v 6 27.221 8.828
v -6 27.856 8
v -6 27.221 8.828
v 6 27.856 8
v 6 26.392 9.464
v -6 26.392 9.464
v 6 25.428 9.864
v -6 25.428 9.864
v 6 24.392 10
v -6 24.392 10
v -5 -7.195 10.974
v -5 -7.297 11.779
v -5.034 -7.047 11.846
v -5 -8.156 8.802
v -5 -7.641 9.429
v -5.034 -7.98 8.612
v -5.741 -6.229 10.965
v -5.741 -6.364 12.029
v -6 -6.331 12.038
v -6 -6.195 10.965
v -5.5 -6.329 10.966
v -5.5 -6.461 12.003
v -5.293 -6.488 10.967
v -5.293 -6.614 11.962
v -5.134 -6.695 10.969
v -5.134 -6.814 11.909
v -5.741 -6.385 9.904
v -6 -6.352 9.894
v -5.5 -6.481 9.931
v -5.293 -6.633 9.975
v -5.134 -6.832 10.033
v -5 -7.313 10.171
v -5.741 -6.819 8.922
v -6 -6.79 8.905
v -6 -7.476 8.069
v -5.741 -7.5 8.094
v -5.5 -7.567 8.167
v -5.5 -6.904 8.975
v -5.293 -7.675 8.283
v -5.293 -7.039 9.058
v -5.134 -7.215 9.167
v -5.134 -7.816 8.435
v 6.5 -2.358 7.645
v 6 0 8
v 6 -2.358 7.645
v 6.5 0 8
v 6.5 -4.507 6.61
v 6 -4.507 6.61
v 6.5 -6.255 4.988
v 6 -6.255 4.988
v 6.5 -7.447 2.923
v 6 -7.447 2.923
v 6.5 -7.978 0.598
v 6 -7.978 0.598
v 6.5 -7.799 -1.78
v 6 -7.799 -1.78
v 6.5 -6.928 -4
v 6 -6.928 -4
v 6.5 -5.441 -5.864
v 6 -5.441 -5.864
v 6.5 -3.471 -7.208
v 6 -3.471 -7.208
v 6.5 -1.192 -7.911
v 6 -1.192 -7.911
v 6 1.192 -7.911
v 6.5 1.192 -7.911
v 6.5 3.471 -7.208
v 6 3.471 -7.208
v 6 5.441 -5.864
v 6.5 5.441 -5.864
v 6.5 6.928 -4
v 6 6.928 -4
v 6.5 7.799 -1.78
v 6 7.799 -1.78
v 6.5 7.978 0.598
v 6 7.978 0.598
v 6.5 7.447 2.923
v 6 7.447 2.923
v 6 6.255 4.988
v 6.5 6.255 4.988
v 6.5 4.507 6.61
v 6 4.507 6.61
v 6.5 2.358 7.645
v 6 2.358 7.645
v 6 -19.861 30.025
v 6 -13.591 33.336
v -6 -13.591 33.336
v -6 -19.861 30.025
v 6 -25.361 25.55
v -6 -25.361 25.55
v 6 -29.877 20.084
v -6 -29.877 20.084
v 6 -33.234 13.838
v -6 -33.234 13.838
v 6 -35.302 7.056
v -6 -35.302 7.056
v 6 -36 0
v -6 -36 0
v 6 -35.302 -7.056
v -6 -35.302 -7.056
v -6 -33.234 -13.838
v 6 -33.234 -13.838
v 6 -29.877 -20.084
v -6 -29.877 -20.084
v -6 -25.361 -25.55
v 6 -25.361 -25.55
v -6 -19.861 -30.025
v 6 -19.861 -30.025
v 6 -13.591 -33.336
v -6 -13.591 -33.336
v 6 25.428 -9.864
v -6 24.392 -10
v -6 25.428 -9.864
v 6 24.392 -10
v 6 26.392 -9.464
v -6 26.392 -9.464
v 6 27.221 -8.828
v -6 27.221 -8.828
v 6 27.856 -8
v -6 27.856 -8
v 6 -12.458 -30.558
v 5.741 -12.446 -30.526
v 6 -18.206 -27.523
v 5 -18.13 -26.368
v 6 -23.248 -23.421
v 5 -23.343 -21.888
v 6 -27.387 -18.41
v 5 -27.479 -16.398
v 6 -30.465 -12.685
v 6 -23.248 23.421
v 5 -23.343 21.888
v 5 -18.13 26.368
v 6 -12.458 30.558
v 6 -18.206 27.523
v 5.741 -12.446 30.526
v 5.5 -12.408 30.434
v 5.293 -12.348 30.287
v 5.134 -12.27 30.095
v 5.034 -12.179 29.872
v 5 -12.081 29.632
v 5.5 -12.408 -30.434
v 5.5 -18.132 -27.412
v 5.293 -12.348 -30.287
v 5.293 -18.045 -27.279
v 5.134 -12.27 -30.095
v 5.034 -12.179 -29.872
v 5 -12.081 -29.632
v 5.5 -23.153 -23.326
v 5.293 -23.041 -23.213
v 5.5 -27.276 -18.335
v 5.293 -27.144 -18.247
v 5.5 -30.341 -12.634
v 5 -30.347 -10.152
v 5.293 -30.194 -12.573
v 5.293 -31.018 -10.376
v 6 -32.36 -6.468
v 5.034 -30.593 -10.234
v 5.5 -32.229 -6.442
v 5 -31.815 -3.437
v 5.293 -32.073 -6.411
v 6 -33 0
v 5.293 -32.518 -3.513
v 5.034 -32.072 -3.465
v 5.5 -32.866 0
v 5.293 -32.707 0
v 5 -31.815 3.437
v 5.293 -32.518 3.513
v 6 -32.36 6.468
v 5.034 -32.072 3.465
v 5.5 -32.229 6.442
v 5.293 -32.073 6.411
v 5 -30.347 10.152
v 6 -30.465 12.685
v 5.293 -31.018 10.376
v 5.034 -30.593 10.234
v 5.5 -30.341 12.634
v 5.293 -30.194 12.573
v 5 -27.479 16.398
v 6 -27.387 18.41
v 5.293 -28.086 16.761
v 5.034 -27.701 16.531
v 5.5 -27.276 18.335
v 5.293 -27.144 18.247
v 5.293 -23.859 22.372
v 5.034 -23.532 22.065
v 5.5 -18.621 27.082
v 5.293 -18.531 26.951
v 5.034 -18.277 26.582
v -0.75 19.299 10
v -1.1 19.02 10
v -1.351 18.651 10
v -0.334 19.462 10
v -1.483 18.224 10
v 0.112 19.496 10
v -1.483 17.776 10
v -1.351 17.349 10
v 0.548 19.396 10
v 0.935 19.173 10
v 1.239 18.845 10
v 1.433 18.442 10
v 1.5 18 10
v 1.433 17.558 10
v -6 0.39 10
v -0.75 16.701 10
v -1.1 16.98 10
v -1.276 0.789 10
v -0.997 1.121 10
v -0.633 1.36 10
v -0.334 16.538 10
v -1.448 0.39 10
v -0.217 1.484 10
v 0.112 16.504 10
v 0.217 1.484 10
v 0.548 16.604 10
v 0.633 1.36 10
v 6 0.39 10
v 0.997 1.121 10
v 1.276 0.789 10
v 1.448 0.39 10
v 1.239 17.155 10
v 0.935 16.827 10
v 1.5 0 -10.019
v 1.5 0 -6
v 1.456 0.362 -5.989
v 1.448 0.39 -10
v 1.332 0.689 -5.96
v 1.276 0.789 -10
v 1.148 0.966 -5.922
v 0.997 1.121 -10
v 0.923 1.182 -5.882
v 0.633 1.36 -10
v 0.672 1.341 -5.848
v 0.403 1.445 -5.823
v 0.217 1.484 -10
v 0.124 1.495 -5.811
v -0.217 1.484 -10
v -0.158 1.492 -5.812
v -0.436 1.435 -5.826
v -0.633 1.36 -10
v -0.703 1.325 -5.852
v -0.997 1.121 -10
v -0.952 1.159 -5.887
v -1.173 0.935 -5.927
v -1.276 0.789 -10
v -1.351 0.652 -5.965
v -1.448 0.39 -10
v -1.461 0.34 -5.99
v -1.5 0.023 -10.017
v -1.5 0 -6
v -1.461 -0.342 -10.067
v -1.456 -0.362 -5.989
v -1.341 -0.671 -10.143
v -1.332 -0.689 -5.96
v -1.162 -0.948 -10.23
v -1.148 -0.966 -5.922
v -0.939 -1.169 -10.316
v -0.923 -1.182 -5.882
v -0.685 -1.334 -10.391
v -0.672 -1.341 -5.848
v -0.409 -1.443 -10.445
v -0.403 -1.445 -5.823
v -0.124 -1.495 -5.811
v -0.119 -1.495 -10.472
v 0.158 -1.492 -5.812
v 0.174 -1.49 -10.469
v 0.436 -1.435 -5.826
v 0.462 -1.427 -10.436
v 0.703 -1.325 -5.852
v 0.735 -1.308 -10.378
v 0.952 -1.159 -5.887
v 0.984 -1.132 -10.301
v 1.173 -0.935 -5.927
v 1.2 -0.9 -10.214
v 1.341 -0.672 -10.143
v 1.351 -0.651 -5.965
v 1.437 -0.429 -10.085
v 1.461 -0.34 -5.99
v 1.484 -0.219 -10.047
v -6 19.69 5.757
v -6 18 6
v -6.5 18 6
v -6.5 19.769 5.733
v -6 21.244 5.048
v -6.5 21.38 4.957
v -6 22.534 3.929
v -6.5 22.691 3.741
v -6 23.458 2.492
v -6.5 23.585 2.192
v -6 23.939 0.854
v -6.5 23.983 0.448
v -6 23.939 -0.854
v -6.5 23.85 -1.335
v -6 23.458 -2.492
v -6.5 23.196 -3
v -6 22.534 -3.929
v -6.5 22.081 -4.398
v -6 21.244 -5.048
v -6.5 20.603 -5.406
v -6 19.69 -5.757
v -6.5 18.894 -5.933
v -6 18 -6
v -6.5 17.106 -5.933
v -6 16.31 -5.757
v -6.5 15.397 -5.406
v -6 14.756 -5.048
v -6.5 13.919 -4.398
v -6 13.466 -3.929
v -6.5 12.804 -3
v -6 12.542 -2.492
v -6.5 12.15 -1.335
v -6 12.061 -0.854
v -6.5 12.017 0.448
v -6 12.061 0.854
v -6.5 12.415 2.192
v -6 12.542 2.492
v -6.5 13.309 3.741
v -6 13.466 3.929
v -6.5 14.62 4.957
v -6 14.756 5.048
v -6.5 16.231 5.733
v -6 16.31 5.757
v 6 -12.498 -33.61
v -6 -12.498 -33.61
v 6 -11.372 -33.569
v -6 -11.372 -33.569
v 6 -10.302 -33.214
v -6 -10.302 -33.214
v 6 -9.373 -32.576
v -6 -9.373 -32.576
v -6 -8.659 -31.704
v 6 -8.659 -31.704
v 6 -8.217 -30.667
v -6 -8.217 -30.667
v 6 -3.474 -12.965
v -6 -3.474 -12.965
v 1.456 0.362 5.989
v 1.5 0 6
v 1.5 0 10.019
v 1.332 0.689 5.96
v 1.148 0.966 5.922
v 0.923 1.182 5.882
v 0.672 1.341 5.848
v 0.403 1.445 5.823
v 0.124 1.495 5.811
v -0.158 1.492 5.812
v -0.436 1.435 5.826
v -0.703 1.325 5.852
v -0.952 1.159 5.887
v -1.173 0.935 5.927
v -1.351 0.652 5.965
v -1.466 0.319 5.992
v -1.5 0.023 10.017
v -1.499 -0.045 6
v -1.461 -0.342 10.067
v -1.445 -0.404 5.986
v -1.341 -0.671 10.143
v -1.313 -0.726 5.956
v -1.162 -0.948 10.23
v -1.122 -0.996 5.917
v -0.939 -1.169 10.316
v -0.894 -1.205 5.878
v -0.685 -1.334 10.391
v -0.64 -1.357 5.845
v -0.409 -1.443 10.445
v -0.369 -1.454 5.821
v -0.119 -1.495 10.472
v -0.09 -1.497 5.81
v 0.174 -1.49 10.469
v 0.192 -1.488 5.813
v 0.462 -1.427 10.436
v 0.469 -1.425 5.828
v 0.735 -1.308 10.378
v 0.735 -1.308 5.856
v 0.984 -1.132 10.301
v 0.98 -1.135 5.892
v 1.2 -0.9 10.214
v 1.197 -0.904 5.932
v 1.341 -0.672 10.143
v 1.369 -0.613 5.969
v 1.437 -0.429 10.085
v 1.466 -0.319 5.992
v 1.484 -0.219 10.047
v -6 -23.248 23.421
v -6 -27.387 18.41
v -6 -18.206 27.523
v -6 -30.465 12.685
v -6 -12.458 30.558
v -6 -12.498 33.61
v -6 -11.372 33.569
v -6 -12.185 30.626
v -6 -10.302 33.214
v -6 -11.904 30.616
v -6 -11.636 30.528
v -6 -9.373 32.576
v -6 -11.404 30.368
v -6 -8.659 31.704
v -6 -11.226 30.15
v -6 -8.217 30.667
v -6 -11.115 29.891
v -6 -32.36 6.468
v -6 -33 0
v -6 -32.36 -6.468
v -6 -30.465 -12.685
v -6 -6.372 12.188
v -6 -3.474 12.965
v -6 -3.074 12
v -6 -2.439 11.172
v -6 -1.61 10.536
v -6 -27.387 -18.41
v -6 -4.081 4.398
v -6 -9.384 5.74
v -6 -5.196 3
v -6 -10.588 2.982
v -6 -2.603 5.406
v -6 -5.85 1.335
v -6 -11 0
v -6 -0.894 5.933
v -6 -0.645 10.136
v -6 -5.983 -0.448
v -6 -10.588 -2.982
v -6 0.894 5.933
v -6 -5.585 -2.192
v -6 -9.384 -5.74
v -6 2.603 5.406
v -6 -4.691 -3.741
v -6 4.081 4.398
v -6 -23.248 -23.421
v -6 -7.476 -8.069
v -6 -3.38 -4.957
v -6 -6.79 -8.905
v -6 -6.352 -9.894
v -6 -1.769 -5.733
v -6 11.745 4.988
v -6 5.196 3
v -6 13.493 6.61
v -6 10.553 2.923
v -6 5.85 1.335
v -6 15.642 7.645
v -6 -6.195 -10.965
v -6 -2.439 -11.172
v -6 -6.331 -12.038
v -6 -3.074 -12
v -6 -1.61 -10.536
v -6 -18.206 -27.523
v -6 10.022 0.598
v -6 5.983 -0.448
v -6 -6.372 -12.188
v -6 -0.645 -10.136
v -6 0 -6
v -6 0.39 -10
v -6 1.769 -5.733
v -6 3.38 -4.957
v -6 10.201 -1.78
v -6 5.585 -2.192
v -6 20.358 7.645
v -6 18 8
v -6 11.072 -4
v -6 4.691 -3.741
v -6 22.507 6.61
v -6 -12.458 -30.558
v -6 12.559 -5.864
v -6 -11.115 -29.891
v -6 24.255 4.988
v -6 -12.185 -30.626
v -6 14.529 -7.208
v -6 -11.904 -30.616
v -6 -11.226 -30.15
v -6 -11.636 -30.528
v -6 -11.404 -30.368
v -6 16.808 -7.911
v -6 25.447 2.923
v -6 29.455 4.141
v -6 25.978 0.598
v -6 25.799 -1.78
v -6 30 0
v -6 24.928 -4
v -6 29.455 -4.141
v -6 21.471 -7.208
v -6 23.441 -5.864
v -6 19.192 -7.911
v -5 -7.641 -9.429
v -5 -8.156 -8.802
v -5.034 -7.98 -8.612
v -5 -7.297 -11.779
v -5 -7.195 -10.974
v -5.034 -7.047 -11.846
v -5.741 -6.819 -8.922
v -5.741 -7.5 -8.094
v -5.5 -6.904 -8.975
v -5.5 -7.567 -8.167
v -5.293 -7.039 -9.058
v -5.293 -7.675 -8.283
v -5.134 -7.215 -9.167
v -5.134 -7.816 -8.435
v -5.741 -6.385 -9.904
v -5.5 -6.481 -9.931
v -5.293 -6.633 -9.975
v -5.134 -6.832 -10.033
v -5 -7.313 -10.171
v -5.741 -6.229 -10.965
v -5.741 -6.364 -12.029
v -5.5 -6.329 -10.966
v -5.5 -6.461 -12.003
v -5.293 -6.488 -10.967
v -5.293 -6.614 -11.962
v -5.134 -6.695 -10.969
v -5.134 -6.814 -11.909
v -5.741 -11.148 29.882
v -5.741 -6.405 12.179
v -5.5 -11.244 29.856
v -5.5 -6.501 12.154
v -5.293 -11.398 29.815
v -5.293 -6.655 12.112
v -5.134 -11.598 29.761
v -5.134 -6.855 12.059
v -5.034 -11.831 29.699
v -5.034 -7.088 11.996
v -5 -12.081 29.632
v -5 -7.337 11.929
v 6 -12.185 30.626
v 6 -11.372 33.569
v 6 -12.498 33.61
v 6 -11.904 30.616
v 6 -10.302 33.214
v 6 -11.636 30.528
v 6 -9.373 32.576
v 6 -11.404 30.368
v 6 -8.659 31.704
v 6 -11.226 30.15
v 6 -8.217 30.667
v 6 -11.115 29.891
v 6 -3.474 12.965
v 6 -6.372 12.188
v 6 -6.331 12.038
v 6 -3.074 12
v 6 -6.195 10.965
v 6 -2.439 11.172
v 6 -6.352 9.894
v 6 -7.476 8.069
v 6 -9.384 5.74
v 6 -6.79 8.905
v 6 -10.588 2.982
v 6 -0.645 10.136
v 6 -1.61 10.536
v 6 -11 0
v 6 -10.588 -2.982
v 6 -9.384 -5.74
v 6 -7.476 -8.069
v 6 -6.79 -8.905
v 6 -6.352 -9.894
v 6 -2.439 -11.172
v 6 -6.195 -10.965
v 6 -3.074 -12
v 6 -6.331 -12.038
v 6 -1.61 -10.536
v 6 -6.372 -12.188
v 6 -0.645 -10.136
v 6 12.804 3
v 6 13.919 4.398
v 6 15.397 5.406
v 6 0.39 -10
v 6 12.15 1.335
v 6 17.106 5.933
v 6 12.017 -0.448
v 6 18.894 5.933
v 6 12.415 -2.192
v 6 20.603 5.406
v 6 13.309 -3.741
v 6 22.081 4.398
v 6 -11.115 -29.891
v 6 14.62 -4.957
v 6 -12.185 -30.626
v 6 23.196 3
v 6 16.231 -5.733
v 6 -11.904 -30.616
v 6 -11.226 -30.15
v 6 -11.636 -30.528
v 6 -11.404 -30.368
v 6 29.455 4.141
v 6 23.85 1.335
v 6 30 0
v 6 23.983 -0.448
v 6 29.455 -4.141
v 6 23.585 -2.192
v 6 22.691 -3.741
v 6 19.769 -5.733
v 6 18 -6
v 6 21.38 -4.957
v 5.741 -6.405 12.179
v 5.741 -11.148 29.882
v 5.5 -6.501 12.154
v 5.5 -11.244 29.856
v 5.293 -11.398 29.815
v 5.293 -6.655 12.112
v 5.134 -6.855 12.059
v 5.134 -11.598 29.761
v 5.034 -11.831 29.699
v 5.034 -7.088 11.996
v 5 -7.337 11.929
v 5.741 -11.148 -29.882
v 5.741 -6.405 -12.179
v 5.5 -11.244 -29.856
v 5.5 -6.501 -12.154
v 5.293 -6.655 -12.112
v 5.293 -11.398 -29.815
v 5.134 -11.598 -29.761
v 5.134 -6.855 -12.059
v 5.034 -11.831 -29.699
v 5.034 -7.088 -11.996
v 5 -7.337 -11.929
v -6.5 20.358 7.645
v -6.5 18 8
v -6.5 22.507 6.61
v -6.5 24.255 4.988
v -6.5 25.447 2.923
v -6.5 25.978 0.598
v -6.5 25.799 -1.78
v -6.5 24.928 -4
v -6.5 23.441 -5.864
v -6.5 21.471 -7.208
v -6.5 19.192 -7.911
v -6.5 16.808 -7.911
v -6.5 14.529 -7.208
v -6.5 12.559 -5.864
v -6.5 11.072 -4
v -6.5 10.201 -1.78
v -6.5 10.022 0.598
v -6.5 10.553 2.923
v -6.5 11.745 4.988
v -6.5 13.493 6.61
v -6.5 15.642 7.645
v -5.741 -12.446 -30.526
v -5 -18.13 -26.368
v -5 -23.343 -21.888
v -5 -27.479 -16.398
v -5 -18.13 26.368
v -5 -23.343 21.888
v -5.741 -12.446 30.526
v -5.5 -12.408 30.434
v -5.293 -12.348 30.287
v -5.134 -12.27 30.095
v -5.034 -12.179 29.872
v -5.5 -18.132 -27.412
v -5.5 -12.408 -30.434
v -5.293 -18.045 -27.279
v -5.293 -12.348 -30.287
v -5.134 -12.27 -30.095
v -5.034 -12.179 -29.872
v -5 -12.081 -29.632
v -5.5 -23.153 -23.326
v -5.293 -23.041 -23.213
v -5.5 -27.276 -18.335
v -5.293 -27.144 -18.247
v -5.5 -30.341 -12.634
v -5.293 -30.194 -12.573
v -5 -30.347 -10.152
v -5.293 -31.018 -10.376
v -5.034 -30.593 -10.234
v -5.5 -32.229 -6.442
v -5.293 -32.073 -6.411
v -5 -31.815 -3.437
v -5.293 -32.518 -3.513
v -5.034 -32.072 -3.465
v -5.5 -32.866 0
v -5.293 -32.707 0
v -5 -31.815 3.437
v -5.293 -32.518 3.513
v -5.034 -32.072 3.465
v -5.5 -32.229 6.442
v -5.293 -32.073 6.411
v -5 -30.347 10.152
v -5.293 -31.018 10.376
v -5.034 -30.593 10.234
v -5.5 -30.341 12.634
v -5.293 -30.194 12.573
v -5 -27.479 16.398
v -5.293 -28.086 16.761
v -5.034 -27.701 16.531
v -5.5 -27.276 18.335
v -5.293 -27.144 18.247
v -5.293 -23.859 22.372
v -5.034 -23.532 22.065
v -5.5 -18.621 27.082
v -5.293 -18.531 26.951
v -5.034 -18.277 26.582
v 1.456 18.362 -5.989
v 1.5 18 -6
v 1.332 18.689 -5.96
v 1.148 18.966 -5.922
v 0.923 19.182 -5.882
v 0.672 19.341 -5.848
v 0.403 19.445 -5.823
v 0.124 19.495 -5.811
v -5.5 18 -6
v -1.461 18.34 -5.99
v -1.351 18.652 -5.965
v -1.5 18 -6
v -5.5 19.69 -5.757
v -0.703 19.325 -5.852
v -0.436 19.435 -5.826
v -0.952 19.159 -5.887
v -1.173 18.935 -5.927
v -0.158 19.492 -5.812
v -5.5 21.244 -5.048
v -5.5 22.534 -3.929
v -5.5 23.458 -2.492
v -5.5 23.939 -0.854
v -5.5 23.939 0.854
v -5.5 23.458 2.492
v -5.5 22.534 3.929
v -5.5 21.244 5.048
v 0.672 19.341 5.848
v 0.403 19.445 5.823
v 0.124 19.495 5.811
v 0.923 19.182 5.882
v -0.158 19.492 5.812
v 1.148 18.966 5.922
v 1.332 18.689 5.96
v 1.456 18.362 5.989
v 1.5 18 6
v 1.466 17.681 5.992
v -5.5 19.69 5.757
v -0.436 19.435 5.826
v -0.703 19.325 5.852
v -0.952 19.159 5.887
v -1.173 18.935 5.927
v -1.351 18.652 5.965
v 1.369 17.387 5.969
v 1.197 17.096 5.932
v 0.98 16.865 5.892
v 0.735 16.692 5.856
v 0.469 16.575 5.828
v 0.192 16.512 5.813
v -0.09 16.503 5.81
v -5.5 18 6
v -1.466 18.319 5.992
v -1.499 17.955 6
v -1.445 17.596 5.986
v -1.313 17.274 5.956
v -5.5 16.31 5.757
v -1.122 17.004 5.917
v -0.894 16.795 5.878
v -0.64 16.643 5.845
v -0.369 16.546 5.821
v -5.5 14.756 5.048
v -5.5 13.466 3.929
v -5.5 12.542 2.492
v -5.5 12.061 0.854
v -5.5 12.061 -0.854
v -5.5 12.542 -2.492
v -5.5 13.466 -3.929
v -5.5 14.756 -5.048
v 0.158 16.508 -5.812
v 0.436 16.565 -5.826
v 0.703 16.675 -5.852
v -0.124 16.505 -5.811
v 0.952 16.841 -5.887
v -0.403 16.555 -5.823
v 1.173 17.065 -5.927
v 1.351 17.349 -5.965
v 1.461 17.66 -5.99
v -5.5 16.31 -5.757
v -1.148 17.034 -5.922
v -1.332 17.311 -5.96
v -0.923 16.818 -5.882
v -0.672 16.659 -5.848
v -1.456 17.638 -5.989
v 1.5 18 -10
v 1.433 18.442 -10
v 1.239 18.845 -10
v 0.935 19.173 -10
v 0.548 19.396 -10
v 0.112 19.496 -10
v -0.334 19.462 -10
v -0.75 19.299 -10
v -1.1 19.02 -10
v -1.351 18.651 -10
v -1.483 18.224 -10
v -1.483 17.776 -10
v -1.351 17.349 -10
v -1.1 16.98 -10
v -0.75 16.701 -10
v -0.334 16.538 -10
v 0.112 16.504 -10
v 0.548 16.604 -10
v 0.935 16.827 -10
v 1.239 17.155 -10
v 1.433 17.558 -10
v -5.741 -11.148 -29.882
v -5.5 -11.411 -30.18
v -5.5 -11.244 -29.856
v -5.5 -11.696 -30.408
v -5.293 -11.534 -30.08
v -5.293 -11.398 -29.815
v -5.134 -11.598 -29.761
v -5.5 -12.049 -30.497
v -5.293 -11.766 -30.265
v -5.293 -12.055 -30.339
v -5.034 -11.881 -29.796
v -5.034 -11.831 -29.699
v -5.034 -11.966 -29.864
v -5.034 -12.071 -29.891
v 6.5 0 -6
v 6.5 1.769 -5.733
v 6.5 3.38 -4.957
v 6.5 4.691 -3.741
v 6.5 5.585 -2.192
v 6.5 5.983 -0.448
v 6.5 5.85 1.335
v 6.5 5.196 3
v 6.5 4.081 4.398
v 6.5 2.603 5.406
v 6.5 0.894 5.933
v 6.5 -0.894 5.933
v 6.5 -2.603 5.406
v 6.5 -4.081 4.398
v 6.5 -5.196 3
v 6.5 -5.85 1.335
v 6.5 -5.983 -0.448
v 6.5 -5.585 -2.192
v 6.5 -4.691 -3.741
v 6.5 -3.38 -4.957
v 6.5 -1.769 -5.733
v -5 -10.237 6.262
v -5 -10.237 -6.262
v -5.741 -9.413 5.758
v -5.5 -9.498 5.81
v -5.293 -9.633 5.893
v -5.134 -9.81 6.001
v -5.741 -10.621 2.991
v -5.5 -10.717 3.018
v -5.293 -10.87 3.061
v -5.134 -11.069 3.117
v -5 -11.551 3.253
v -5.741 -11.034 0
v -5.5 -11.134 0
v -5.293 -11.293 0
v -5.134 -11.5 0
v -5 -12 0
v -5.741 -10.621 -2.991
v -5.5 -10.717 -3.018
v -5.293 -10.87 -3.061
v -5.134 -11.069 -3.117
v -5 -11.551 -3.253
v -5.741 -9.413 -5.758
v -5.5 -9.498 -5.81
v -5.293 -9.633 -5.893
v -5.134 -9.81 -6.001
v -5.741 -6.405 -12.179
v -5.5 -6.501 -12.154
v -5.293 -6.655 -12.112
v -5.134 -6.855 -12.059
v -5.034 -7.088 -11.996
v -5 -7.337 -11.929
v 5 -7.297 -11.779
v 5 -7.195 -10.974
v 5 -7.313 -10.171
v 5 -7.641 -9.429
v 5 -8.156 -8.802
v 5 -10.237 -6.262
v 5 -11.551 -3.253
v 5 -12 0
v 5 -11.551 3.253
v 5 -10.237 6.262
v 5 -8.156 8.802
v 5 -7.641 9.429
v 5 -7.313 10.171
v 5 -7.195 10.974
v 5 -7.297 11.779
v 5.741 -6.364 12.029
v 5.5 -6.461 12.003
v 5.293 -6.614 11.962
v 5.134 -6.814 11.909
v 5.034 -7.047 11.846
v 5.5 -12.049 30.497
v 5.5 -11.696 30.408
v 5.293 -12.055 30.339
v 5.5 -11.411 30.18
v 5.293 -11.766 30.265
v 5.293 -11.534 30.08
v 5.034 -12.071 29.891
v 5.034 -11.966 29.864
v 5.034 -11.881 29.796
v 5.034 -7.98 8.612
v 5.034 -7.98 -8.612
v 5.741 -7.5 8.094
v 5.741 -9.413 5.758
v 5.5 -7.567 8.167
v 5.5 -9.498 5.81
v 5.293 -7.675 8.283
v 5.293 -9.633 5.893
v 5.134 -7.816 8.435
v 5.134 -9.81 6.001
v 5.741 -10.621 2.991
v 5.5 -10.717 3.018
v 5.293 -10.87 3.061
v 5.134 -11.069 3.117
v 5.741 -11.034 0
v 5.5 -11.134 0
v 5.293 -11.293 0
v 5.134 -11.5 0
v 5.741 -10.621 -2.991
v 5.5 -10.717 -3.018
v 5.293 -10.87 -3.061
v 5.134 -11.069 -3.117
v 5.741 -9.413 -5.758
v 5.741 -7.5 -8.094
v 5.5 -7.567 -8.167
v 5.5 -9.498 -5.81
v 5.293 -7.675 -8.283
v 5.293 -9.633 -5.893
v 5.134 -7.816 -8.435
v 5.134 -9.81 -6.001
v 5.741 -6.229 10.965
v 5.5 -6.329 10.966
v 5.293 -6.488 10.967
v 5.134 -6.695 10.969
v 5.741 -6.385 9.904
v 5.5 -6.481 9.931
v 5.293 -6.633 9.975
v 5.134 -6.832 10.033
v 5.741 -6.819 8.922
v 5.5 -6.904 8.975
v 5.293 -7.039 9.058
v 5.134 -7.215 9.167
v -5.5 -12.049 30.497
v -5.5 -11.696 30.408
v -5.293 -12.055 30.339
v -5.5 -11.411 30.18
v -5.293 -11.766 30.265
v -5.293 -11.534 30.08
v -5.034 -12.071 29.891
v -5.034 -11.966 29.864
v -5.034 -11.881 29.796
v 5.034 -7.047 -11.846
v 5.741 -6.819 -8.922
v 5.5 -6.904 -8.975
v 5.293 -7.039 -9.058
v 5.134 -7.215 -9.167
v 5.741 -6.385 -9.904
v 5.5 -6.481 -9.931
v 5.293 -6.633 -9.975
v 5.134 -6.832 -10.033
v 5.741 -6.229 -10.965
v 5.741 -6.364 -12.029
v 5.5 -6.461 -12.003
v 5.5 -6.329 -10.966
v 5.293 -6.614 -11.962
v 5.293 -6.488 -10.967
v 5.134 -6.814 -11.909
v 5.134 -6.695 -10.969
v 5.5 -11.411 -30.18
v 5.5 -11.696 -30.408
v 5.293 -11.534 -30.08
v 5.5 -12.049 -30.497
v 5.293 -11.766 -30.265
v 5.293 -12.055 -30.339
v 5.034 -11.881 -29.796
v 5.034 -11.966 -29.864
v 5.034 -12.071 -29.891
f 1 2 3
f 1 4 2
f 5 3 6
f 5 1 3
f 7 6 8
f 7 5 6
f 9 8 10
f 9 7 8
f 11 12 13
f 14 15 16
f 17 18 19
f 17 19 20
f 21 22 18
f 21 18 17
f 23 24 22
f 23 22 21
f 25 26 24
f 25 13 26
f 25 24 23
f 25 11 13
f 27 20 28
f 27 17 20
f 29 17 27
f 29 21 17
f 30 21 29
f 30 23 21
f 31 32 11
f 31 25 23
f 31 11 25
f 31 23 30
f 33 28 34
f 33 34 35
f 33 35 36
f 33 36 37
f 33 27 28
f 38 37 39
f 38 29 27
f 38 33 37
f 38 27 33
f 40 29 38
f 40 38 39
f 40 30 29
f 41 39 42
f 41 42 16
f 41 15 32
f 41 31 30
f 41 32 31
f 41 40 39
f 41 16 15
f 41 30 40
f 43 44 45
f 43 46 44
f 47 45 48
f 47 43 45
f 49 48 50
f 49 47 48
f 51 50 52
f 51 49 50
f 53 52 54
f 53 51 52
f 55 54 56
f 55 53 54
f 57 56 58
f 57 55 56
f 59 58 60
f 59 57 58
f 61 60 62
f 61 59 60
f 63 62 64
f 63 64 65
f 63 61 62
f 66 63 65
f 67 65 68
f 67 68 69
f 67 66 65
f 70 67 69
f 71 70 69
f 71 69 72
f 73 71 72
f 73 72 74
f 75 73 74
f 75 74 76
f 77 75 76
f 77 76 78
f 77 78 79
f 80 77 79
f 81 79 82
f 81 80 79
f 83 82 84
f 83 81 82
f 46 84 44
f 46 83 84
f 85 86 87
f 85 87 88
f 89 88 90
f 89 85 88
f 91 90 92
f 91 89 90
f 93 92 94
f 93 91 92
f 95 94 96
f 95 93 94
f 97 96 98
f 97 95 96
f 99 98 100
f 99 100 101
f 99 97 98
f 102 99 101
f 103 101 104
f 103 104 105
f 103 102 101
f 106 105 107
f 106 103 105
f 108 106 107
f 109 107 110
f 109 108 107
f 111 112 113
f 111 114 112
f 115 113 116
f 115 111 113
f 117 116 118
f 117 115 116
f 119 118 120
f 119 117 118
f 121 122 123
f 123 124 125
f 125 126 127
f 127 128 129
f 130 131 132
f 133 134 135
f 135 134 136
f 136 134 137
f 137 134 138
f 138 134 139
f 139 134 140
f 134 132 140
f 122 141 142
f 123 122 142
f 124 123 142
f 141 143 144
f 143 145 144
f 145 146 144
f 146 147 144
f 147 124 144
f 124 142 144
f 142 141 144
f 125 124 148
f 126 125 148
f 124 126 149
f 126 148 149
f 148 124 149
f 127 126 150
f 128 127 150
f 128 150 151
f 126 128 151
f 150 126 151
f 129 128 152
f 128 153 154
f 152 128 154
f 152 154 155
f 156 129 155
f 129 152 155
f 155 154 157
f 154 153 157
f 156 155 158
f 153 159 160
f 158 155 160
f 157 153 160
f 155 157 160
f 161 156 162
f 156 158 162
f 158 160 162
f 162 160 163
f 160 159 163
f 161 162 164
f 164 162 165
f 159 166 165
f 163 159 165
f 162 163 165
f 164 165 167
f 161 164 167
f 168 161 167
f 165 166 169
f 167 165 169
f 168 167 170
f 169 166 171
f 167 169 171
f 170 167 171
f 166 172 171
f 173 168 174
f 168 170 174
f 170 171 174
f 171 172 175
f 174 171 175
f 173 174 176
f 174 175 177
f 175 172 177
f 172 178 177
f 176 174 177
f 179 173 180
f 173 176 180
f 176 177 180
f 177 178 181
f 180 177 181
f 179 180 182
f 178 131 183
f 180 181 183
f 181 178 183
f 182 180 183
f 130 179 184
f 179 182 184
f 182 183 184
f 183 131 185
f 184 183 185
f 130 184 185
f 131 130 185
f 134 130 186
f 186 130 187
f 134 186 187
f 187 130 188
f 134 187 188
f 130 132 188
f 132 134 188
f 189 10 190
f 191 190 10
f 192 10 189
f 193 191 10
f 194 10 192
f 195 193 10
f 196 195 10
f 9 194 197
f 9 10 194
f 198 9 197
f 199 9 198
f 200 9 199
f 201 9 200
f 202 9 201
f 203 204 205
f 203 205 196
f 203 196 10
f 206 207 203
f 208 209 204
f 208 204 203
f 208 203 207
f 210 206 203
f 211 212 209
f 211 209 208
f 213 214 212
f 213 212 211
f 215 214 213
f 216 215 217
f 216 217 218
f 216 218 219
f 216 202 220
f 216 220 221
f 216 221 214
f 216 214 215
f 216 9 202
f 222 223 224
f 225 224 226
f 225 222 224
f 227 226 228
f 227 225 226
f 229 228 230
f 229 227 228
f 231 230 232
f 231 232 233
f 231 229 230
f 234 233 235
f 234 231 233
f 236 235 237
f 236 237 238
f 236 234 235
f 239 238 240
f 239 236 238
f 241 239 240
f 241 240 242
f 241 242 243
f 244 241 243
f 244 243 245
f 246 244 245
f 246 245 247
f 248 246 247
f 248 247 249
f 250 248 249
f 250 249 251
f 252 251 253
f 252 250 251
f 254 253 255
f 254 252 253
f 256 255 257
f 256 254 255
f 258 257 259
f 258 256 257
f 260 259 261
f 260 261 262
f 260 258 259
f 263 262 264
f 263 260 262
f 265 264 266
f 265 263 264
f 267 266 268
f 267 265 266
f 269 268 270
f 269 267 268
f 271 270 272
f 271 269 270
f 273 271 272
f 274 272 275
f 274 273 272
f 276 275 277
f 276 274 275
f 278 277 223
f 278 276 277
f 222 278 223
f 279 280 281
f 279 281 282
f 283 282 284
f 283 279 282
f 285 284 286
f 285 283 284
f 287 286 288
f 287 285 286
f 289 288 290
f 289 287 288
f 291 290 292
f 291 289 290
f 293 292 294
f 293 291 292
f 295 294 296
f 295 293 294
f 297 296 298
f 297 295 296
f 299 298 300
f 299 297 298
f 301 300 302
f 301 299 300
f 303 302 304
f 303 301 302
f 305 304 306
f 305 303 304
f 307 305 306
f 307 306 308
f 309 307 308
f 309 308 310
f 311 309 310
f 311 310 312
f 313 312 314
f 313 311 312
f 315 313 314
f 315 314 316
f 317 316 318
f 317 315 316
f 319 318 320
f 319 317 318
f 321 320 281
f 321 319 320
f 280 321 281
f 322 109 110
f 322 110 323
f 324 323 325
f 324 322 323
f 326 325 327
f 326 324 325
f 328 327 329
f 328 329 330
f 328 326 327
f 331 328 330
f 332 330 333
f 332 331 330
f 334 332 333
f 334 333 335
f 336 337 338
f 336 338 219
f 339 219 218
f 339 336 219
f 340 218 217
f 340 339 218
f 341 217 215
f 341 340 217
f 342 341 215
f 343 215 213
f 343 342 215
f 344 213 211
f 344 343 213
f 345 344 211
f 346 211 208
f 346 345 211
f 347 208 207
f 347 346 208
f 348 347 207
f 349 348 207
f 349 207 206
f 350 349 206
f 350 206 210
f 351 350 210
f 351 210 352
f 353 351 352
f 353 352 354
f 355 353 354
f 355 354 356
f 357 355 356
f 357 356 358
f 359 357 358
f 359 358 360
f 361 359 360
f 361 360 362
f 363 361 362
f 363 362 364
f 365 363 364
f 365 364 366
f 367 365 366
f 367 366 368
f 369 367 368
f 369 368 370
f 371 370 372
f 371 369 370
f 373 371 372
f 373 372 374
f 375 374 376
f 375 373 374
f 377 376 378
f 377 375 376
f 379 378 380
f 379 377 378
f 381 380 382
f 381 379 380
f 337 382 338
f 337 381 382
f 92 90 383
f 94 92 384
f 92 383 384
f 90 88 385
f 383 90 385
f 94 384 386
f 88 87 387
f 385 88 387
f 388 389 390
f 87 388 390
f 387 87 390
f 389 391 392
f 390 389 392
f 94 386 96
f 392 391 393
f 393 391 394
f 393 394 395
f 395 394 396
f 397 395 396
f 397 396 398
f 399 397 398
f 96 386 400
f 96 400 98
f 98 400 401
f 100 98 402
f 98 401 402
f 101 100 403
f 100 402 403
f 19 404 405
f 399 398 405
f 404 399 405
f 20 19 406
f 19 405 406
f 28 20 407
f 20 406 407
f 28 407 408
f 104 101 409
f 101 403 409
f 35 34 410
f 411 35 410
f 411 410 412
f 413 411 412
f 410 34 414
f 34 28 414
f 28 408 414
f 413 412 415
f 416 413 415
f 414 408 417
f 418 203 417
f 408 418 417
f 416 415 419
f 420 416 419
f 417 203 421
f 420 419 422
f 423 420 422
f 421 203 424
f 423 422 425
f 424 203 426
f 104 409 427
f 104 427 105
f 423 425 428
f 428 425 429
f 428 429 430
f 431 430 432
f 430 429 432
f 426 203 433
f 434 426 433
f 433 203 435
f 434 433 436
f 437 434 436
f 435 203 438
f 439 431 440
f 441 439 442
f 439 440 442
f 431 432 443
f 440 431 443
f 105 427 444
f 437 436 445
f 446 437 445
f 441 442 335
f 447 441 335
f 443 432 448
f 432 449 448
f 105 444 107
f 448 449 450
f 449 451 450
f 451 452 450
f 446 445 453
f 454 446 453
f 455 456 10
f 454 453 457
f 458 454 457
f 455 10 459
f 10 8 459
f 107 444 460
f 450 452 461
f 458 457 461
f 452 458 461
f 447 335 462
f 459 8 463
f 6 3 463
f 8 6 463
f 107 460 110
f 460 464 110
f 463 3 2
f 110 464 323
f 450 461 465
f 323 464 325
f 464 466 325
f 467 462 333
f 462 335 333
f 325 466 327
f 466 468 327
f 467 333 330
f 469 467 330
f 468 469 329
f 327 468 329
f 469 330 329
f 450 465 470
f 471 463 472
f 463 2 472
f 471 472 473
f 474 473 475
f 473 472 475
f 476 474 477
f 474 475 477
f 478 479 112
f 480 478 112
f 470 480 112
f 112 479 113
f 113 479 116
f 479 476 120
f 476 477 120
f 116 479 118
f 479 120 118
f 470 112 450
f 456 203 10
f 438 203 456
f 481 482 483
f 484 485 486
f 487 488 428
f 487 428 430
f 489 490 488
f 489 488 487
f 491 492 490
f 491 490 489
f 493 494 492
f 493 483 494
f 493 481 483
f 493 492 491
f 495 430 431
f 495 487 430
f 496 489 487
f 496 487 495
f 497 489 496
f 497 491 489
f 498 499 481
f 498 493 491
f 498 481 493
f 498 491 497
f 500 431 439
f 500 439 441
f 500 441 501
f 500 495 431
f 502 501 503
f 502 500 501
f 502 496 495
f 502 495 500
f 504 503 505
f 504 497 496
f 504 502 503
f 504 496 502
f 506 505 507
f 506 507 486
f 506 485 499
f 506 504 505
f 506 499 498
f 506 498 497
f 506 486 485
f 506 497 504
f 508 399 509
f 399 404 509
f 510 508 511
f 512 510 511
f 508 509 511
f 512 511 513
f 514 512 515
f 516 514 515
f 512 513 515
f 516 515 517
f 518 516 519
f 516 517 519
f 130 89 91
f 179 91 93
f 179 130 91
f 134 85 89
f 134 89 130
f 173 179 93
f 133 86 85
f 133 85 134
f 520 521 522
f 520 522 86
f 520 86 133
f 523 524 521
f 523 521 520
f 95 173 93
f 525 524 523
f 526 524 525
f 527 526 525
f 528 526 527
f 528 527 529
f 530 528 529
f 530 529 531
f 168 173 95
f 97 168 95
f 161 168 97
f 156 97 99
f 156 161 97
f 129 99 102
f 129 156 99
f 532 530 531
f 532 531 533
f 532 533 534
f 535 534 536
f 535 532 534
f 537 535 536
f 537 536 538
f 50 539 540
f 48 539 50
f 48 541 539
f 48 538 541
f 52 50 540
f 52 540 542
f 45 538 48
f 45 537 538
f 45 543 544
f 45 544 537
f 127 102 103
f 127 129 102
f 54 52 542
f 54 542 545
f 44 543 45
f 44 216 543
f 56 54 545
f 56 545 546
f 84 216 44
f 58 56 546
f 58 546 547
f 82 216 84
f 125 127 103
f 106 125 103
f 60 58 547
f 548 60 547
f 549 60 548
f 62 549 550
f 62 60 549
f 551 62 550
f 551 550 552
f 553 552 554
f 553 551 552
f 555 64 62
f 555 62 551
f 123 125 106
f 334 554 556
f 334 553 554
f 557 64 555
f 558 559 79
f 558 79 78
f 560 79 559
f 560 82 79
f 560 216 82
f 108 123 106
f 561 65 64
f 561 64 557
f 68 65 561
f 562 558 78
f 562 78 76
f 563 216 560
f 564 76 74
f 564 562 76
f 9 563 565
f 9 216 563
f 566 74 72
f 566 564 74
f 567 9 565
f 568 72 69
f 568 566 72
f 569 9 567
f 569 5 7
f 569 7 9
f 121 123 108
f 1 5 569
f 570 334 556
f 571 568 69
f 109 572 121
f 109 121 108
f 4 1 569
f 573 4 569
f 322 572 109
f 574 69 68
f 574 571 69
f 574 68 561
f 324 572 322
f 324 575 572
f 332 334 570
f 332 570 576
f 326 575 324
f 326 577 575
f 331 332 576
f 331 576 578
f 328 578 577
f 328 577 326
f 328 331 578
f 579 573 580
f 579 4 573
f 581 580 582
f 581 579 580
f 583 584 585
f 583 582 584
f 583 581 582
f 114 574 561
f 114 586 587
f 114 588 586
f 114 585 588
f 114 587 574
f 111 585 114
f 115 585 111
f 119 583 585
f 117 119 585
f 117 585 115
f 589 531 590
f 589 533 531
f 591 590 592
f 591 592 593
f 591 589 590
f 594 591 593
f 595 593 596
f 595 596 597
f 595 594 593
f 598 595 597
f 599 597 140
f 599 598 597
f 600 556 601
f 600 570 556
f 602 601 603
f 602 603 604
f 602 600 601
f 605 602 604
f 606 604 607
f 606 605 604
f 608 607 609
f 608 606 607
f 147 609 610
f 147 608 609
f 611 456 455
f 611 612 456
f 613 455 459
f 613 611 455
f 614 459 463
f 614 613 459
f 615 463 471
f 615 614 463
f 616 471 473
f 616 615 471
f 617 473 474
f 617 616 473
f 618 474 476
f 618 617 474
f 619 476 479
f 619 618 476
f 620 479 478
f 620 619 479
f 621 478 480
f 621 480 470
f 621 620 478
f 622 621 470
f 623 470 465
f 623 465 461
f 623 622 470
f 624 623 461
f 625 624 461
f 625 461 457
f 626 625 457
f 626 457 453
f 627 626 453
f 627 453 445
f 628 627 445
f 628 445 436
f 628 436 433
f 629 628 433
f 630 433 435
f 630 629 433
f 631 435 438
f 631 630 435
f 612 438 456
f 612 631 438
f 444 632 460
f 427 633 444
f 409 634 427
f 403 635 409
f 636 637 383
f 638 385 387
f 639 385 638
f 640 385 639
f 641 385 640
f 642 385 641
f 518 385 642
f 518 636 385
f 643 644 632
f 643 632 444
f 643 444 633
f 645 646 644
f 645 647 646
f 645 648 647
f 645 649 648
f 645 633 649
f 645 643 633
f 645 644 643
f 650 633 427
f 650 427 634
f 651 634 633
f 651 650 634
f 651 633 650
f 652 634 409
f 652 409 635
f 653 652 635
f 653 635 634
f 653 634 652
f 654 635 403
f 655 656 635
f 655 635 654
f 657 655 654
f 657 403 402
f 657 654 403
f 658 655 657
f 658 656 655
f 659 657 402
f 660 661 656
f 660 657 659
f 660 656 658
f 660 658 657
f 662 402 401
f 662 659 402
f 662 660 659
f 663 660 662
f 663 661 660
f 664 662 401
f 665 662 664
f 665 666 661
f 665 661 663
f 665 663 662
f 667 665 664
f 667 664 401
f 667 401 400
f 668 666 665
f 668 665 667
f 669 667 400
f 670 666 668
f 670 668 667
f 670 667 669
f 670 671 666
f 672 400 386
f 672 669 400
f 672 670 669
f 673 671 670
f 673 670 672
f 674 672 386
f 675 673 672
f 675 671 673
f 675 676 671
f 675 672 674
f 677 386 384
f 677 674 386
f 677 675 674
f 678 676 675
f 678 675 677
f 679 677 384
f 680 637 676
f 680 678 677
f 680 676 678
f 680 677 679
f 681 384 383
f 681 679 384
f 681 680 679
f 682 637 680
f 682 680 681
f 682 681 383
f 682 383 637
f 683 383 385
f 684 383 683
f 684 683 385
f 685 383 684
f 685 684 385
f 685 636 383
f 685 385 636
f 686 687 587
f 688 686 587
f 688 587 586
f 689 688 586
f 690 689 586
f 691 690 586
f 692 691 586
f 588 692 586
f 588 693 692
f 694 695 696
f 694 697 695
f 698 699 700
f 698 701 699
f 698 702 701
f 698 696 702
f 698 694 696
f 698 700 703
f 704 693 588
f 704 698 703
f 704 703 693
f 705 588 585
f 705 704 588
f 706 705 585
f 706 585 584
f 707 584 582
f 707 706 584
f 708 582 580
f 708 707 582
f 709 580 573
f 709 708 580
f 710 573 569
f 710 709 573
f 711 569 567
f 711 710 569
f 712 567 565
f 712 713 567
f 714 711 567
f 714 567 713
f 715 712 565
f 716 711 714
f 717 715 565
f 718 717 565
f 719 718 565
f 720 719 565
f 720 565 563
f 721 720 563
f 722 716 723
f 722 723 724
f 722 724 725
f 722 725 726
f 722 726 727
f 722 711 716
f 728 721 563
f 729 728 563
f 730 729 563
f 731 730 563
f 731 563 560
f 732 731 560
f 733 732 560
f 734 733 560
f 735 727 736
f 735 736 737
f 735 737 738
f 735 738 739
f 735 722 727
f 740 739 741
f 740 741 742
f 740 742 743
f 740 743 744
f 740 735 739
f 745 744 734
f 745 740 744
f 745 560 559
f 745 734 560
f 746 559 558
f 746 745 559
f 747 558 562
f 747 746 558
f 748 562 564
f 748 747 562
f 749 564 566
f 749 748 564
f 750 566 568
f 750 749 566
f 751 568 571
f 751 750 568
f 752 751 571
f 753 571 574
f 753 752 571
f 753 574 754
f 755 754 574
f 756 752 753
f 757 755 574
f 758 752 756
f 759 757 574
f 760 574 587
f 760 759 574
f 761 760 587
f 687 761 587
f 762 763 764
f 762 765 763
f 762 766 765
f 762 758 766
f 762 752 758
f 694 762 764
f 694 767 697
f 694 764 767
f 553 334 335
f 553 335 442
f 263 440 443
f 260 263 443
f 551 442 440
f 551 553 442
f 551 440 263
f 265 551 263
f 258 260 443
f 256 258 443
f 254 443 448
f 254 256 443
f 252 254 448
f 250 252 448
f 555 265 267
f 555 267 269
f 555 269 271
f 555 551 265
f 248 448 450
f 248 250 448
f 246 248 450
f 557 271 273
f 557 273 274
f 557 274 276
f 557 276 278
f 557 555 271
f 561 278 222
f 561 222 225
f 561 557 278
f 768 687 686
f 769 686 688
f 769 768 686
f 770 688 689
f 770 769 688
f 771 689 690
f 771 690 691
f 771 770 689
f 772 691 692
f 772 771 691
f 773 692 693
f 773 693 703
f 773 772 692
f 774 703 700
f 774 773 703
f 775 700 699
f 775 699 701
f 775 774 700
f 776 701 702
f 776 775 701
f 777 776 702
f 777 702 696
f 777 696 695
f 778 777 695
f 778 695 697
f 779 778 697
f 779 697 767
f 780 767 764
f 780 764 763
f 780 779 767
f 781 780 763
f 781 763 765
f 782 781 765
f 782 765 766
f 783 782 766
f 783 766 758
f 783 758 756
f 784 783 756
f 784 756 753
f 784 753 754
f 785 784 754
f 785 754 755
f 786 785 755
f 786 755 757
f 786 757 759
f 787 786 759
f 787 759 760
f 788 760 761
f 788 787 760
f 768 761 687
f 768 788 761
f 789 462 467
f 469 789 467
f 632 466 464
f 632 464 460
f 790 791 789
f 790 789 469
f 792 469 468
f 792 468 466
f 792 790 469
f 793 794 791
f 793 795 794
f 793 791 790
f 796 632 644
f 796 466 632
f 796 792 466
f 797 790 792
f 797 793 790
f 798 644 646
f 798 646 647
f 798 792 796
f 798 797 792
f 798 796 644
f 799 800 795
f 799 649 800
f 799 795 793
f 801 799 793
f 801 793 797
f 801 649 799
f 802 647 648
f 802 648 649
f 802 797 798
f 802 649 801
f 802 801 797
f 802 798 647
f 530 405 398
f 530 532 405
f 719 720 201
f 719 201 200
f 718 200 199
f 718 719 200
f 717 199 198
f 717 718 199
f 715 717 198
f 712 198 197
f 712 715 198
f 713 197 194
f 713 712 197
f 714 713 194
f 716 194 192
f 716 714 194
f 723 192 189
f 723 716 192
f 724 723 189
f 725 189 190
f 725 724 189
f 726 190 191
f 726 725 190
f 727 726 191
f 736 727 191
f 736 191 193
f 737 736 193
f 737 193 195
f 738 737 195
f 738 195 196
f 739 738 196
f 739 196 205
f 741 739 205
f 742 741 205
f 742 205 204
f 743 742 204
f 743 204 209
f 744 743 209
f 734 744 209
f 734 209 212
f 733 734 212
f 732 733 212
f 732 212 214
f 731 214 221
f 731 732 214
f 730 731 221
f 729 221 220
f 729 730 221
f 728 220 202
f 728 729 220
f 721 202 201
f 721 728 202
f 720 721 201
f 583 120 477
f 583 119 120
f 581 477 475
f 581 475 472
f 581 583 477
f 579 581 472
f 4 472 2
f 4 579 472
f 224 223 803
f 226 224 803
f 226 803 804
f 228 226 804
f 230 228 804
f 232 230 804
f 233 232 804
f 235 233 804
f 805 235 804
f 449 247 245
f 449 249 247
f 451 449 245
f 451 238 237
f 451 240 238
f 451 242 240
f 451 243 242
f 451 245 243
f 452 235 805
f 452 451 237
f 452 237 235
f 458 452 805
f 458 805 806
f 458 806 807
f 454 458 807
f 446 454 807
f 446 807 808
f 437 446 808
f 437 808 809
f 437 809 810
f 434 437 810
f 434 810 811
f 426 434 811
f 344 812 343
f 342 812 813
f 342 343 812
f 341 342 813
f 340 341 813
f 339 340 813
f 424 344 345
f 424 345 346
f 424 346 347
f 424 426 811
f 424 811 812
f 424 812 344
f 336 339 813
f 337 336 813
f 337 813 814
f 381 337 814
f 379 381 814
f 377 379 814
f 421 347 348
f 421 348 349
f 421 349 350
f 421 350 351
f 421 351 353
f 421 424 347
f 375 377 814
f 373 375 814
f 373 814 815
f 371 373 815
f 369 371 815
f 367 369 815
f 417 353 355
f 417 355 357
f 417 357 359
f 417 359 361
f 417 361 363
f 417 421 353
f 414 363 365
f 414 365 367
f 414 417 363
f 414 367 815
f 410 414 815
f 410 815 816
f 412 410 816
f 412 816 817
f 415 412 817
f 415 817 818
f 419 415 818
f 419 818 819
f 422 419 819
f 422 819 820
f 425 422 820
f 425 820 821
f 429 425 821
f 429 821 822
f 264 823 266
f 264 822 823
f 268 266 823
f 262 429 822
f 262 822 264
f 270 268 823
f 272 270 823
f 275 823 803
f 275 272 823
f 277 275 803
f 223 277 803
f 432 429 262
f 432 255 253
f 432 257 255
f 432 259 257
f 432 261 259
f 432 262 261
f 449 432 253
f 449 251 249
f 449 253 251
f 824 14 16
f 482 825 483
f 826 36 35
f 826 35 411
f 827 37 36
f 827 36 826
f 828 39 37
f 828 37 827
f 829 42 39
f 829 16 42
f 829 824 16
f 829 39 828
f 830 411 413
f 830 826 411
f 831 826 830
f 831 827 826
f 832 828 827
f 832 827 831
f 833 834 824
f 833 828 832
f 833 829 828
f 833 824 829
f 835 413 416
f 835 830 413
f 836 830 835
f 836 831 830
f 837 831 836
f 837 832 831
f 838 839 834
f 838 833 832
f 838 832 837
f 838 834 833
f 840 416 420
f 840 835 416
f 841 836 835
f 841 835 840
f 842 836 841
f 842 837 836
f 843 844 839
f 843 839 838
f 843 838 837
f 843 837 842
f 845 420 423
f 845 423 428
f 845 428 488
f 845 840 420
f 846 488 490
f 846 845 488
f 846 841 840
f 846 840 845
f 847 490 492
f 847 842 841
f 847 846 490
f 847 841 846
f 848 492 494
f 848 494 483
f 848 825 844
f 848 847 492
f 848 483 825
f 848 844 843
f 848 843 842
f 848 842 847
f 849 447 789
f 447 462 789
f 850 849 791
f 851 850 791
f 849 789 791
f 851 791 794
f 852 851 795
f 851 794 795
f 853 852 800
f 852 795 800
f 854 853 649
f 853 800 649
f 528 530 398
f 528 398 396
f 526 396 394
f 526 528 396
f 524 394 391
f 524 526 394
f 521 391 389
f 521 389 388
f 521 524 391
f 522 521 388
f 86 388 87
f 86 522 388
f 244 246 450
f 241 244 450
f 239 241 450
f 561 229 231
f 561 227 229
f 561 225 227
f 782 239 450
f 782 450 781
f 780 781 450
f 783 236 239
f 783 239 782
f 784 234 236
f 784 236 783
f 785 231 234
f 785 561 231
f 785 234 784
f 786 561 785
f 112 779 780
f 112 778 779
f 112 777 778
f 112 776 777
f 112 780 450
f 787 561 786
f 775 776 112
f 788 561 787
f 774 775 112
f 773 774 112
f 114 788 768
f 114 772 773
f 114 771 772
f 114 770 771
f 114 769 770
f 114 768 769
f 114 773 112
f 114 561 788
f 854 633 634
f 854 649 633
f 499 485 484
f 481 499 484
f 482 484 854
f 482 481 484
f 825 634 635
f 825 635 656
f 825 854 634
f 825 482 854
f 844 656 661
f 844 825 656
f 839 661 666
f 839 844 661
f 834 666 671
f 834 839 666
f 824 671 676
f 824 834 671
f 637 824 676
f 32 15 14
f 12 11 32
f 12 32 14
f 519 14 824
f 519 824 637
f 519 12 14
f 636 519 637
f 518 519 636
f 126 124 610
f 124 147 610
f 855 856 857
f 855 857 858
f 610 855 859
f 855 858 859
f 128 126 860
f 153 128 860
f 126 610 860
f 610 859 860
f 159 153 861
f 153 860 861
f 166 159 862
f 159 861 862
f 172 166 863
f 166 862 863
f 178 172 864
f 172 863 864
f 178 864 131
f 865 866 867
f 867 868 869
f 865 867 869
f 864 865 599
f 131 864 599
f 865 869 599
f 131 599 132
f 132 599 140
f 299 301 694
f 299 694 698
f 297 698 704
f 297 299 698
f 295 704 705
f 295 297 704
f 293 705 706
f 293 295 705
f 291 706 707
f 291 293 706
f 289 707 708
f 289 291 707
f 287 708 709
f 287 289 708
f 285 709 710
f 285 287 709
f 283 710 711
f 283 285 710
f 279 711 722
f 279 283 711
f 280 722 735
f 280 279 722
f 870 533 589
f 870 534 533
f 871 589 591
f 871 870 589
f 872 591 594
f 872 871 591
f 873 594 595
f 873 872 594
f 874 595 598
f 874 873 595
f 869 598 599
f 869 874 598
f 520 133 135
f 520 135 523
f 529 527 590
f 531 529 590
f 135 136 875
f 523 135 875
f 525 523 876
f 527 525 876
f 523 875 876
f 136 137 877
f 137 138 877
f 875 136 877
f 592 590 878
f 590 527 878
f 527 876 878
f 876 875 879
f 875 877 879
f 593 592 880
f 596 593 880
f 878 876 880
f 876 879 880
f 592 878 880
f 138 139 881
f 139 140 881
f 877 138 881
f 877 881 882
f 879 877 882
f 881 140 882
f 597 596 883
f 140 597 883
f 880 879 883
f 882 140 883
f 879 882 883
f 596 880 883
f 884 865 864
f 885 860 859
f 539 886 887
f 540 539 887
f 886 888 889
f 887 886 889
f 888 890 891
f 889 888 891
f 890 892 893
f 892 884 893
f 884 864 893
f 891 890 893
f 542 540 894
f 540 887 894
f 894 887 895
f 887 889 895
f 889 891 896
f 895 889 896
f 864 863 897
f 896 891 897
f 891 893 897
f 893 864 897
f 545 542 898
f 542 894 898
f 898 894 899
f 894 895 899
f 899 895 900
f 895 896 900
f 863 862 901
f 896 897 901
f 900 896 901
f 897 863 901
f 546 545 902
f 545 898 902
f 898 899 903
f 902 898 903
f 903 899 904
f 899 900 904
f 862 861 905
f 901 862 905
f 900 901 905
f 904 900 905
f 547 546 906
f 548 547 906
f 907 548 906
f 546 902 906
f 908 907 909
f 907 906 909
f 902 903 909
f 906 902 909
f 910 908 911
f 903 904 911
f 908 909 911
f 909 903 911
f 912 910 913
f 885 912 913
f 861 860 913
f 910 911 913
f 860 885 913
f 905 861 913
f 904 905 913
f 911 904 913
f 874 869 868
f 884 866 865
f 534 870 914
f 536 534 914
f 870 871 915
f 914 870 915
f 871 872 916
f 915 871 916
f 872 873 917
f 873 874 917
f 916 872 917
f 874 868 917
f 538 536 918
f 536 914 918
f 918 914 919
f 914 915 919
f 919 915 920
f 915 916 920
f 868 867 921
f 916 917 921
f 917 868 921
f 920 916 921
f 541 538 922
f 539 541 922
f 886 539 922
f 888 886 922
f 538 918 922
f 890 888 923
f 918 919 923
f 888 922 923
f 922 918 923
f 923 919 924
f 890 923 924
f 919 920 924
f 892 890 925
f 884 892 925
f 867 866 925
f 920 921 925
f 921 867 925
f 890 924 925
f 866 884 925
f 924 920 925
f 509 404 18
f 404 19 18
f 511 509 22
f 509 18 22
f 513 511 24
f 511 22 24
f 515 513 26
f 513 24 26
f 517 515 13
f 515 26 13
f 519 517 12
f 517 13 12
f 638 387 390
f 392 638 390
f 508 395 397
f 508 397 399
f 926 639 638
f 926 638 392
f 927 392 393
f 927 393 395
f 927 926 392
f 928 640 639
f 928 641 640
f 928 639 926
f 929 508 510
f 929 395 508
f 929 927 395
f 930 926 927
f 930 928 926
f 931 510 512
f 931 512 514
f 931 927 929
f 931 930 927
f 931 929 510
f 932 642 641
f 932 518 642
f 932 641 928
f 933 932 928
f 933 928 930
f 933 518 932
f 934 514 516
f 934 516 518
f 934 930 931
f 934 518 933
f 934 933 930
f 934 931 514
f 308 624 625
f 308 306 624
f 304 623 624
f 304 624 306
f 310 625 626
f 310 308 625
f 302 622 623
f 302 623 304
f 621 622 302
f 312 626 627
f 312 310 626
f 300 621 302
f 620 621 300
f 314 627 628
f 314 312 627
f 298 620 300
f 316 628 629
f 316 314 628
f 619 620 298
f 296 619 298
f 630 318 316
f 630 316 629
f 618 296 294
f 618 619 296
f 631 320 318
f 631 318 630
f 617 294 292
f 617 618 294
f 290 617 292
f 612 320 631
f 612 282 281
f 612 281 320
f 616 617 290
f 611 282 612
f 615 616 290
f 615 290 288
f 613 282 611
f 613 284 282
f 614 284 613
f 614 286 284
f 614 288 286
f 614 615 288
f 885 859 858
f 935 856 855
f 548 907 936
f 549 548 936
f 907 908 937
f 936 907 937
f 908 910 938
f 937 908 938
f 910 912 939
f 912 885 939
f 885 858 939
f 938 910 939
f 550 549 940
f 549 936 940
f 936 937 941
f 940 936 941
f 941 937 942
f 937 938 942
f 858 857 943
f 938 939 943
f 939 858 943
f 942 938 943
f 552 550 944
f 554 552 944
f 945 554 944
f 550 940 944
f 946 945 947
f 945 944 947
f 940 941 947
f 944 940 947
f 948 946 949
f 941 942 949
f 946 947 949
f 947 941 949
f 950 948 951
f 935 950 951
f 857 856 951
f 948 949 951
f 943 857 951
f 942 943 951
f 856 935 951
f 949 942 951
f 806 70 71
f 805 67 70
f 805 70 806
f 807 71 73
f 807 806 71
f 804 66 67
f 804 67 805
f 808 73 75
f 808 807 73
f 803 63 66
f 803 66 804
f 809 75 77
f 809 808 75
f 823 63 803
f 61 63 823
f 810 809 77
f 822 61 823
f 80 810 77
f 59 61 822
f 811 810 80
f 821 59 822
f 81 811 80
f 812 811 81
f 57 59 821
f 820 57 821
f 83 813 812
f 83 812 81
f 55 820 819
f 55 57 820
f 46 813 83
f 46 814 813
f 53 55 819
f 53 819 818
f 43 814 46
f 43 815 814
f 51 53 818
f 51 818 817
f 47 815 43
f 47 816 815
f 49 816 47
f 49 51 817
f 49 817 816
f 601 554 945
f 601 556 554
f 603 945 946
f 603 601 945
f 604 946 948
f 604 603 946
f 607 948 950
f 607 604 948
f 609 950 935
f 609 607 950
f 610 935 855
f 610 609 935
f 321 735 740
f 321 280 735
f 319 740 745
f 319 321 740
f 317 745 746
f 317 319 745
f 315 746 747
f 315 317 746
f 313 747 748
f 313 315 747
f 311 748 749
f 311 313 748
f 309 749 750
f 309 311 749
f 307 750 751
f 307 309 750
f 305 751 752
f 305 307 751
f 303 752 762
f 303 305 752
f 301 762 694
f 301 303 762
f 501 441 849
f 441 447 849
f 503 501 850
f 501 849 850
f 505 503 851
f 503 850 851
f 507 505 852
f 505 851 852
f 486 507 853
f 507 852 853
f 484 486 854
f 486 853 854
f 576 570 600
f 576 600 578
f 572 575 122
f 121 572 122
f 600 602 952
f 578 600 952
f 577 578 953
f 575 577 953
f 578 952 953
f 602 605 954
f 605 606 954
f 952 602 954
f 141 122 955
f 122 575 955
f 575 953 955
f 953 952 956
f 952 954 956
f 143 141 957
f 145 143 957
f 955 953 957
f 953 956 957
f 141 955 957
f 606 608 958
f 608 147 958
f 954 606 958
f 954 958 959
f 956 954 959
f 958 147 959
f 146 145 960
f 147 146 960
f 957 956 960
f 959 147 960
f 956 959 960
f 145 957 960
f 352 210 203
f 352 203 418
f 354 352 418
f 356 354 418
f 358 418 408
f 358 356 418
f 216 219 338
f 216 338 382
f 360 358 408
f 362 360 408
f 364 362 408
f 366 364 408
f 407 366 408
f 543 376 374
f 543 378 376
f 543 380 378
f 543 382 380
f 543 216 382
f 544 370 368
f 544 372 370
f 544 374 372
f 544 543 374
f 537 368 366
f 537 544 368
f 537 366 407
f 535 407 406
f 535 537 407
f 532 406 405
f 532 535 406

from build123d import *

# Parameters (mm, degrees)
SKETCH1_R               = 6
BOSS_EXTRUDE1_DEPTH     = 6
CUT_EXTRUDE1_DEPTH      = 1
FILLET1_R               = 1
FILLET1_OF_MIRROR1_R    = 1
SKETCH3_R               = 8
SKETCH3_R_2             = 6
BOSS_EXTRUDE2_DEPTH     = 0.5
SKETCH4_R               = 8
SKETCH4_R_2             = 6
BOSS_EXTRUDE3_DEPTH     = 0.5
CUT_EXTRUDE2_DEPTH      = 50.692614274
CUT_EXTRUDE2_DEPTH_BACK = 50.692614274
SKETCH5_R               = 1.5


with BuildPart() as part:
    # Sketch1 → Boss-Extrude1 (new, symmetric)
    with BuildSketch(Plane(origin=(0, 0, 0), x_dir=(0, 0, -1), z_dir=(1, 0, 0))):
        with BuildLine():
            Line((-12.96472382, -3.473887278), (-30.667194256, -8.217249935))
            ThreePointArc((-30.667194256, -8.217249935), (-33.214466382, -10.301810854), (-33.335907835, -13.591072395))
            ThreePointArc((-33.335907835, -13.591072395), (0, -36), (33.335907835, -13.591072395))
            ThreePointArc((33.335907835, -13.591072395), (33.214466382, -10.301810854), (30.667194256, -8.217249935))
            Line((30.667194256, -8.217249935), (12.96472382, -3.473887278))
            ThreePointArc((12.96472382, -3.473887278), (10.826586639, -2.045229688), (10, 0.389816028))
            Line((10, 0.389816028), (10, 24.392304845))
            ThreePointArc((10, 24.392304845), (9.464101615, 26.392304845), (8, 27.856406461))
            ThreePointArc((8, 27.856406461), (0, 30), (-8, 27.856406461))
            ThreePointArc((-8, 27.856406461), (-9.464101615, 26.392304845), (-10, 24.392304845))
            Line((-10, 24.392304845), (-10, 0.389816028))
            ThreePointArc((-10, 0.389816028), (-10.826586639, -2.045229688), (-12.96472382, -3.473887278))
        make_face()
        Circle(SKETCH1_R, mode=Mode.SUBTRACT)
        with Locations((0, 18)):
            Circle(SKETCH1_R, mode=Mode.SUBTRACT)
    extrude(amount=BOSS_EXTRUDE1_DEPTH, both=True)

    # Sketch2 → Cut-Extrude1 (cut, symmetric)
    with BuildSketch(Plane(origin=(6, 0, 0), x_dir=(0, 0, -1), z_dir=(1, 0, 0))):
        with BuildLine():
            ThreePointArc((-12.037997029, -6.331400124), (-9.894070596, -6.35181127), (-8.068661956, -7.476409181))
            ThreePointArc((-8.068661956, -7.476409181), (0, -11), (8.068661956, -7.476409181))
            ThreePointArc((8.068661956, -7.476409181), (9.894070596, -6.35181127), (12.037997029, -6.331400124))
            Line((12.037997029, -6.331400124), (12.188266684, -6.371664756))
            Line((12.188266684, -6.371664756), (29.89073712, -11.115027414))
            ThreePointArc((29.89073712, -11.115027414), (30.527555152, -11.636167644), (30.557915515, -12.458483029))
            ThreePointArc((30.557915515, -12.458483029), (0, -33), (-30.557915515, -12.458483029))
            ThreePointArc((-30.557915515, -12.458483029), (-30.527555152, -11.636167644), (-29.89073712, -11.115027414))
            Line((-29.89073712, -11.115027414), (-12.188266684, -6.371664756))
            Line((-12.188266684, -6.371664756), (-12.037997029, -6.331400124))
        make_face()
    cut_extrude1 = extrude(amount=CUT_EXTRUDE1_DEPTH, both=True, mode=Mode.SUBTRACT)

    # Fillet1
    fillet1_edges = [part.edges().sort_by_distance(p)[0] for p in [
        (5, -11, 0),
        (5, -6.35181127, -9.894070596),
        (5, -8.723213769, -20.964367075),
        (5, -11.636167644, -30.527555152),
        (5, -33, 0),
        (5, -11.636167644, 30.527555152),
        (5, -8.723213769, 20.964367075),
        (5, -6.35181127, 9.894070596),
    ]]
    fillet(fillet1_edges, radius=FILLET1_R - 0.0001)  # a hair under: the kernel refuses the full size

    # Mirror1: Cut-Extrude1 across plane
    add(cut_extrude1.mirror(Plane(origin=(0, 0, 0), x_dir=(0, 0, 1), z_dir=(1, 0, 0))), mode=Mode.SUBTRACT)

    # Fillet1 of Mirror1
    fillet1_of_mirror1_edges = [part.edges().sort_by_distance(p)[0] for p in [
        (-5, -11, 0),
        (-5, -6.35181127, -9.894070596),
        (-5, -8.723213769, -20.964367075),
        (-5, -11.636167644, -30.527555152),
        (-5, -33, 0),
        (-5, -11.636167644, 30.527555152),
        (-5, -8.723213769, 20.964367075),
        (-5, -6.35181127, 9.894070596),
    ]]
    fillet(fillet1_of_mirror1_edges, radius=FILLET1_OF_MIRROR1_R - 0.0001)  # a hair under: the kernel refuses the full size

    # Sketch3 → Boss-Extrude2 (add, symmetric)
    with BuildSketch(Plane(origin=(6, 0, 0), x_dir=(0, 0, -1), z_dir=(1, 0, 0))):
        with Locations(Location((0, 0, 0), (0, 0, 180))):
            Circle(SKETCH3_R)
        Circle(SKETCH3_R_2, mode=Mode.SUBTRACT)
    extrude(amount=BOSS_EXTRUDE2_DEPTH, both=True)

    # Sketch4 → Boss-Extrude3 (add, symmetric)
    with BuildSketch(Plane.ZY.offset(6)):
        with Locations((0, 18)):
            Circle(SKETCH4_R)
        with Locations((0, 18)):
            Circle(SKETCH4_R_2, mode=Mode.SUBTRACT)
    extrude(amount=BOSS_EXTRUDE3_DEPTH, both=True)

    # Sketch5 → Cut-Extrude2 (cut, two sides: drawn at the far end of the back side and taken through both)
    with BuildSketch(Plane.XY.offset(-CUT_EXTRUDE2_DEPTH_BACK)):
        with Locations((0, 18)):
            Circle(SKETCH5_R)
        Circle(SKETCH5_R)
    extrude(amount=CUT_EXTRUDE2_DEPTH + CUT_EXTRUDE2_DEPTH_BACK, mode=Mode.SUBTRACT)


solid = part.part
